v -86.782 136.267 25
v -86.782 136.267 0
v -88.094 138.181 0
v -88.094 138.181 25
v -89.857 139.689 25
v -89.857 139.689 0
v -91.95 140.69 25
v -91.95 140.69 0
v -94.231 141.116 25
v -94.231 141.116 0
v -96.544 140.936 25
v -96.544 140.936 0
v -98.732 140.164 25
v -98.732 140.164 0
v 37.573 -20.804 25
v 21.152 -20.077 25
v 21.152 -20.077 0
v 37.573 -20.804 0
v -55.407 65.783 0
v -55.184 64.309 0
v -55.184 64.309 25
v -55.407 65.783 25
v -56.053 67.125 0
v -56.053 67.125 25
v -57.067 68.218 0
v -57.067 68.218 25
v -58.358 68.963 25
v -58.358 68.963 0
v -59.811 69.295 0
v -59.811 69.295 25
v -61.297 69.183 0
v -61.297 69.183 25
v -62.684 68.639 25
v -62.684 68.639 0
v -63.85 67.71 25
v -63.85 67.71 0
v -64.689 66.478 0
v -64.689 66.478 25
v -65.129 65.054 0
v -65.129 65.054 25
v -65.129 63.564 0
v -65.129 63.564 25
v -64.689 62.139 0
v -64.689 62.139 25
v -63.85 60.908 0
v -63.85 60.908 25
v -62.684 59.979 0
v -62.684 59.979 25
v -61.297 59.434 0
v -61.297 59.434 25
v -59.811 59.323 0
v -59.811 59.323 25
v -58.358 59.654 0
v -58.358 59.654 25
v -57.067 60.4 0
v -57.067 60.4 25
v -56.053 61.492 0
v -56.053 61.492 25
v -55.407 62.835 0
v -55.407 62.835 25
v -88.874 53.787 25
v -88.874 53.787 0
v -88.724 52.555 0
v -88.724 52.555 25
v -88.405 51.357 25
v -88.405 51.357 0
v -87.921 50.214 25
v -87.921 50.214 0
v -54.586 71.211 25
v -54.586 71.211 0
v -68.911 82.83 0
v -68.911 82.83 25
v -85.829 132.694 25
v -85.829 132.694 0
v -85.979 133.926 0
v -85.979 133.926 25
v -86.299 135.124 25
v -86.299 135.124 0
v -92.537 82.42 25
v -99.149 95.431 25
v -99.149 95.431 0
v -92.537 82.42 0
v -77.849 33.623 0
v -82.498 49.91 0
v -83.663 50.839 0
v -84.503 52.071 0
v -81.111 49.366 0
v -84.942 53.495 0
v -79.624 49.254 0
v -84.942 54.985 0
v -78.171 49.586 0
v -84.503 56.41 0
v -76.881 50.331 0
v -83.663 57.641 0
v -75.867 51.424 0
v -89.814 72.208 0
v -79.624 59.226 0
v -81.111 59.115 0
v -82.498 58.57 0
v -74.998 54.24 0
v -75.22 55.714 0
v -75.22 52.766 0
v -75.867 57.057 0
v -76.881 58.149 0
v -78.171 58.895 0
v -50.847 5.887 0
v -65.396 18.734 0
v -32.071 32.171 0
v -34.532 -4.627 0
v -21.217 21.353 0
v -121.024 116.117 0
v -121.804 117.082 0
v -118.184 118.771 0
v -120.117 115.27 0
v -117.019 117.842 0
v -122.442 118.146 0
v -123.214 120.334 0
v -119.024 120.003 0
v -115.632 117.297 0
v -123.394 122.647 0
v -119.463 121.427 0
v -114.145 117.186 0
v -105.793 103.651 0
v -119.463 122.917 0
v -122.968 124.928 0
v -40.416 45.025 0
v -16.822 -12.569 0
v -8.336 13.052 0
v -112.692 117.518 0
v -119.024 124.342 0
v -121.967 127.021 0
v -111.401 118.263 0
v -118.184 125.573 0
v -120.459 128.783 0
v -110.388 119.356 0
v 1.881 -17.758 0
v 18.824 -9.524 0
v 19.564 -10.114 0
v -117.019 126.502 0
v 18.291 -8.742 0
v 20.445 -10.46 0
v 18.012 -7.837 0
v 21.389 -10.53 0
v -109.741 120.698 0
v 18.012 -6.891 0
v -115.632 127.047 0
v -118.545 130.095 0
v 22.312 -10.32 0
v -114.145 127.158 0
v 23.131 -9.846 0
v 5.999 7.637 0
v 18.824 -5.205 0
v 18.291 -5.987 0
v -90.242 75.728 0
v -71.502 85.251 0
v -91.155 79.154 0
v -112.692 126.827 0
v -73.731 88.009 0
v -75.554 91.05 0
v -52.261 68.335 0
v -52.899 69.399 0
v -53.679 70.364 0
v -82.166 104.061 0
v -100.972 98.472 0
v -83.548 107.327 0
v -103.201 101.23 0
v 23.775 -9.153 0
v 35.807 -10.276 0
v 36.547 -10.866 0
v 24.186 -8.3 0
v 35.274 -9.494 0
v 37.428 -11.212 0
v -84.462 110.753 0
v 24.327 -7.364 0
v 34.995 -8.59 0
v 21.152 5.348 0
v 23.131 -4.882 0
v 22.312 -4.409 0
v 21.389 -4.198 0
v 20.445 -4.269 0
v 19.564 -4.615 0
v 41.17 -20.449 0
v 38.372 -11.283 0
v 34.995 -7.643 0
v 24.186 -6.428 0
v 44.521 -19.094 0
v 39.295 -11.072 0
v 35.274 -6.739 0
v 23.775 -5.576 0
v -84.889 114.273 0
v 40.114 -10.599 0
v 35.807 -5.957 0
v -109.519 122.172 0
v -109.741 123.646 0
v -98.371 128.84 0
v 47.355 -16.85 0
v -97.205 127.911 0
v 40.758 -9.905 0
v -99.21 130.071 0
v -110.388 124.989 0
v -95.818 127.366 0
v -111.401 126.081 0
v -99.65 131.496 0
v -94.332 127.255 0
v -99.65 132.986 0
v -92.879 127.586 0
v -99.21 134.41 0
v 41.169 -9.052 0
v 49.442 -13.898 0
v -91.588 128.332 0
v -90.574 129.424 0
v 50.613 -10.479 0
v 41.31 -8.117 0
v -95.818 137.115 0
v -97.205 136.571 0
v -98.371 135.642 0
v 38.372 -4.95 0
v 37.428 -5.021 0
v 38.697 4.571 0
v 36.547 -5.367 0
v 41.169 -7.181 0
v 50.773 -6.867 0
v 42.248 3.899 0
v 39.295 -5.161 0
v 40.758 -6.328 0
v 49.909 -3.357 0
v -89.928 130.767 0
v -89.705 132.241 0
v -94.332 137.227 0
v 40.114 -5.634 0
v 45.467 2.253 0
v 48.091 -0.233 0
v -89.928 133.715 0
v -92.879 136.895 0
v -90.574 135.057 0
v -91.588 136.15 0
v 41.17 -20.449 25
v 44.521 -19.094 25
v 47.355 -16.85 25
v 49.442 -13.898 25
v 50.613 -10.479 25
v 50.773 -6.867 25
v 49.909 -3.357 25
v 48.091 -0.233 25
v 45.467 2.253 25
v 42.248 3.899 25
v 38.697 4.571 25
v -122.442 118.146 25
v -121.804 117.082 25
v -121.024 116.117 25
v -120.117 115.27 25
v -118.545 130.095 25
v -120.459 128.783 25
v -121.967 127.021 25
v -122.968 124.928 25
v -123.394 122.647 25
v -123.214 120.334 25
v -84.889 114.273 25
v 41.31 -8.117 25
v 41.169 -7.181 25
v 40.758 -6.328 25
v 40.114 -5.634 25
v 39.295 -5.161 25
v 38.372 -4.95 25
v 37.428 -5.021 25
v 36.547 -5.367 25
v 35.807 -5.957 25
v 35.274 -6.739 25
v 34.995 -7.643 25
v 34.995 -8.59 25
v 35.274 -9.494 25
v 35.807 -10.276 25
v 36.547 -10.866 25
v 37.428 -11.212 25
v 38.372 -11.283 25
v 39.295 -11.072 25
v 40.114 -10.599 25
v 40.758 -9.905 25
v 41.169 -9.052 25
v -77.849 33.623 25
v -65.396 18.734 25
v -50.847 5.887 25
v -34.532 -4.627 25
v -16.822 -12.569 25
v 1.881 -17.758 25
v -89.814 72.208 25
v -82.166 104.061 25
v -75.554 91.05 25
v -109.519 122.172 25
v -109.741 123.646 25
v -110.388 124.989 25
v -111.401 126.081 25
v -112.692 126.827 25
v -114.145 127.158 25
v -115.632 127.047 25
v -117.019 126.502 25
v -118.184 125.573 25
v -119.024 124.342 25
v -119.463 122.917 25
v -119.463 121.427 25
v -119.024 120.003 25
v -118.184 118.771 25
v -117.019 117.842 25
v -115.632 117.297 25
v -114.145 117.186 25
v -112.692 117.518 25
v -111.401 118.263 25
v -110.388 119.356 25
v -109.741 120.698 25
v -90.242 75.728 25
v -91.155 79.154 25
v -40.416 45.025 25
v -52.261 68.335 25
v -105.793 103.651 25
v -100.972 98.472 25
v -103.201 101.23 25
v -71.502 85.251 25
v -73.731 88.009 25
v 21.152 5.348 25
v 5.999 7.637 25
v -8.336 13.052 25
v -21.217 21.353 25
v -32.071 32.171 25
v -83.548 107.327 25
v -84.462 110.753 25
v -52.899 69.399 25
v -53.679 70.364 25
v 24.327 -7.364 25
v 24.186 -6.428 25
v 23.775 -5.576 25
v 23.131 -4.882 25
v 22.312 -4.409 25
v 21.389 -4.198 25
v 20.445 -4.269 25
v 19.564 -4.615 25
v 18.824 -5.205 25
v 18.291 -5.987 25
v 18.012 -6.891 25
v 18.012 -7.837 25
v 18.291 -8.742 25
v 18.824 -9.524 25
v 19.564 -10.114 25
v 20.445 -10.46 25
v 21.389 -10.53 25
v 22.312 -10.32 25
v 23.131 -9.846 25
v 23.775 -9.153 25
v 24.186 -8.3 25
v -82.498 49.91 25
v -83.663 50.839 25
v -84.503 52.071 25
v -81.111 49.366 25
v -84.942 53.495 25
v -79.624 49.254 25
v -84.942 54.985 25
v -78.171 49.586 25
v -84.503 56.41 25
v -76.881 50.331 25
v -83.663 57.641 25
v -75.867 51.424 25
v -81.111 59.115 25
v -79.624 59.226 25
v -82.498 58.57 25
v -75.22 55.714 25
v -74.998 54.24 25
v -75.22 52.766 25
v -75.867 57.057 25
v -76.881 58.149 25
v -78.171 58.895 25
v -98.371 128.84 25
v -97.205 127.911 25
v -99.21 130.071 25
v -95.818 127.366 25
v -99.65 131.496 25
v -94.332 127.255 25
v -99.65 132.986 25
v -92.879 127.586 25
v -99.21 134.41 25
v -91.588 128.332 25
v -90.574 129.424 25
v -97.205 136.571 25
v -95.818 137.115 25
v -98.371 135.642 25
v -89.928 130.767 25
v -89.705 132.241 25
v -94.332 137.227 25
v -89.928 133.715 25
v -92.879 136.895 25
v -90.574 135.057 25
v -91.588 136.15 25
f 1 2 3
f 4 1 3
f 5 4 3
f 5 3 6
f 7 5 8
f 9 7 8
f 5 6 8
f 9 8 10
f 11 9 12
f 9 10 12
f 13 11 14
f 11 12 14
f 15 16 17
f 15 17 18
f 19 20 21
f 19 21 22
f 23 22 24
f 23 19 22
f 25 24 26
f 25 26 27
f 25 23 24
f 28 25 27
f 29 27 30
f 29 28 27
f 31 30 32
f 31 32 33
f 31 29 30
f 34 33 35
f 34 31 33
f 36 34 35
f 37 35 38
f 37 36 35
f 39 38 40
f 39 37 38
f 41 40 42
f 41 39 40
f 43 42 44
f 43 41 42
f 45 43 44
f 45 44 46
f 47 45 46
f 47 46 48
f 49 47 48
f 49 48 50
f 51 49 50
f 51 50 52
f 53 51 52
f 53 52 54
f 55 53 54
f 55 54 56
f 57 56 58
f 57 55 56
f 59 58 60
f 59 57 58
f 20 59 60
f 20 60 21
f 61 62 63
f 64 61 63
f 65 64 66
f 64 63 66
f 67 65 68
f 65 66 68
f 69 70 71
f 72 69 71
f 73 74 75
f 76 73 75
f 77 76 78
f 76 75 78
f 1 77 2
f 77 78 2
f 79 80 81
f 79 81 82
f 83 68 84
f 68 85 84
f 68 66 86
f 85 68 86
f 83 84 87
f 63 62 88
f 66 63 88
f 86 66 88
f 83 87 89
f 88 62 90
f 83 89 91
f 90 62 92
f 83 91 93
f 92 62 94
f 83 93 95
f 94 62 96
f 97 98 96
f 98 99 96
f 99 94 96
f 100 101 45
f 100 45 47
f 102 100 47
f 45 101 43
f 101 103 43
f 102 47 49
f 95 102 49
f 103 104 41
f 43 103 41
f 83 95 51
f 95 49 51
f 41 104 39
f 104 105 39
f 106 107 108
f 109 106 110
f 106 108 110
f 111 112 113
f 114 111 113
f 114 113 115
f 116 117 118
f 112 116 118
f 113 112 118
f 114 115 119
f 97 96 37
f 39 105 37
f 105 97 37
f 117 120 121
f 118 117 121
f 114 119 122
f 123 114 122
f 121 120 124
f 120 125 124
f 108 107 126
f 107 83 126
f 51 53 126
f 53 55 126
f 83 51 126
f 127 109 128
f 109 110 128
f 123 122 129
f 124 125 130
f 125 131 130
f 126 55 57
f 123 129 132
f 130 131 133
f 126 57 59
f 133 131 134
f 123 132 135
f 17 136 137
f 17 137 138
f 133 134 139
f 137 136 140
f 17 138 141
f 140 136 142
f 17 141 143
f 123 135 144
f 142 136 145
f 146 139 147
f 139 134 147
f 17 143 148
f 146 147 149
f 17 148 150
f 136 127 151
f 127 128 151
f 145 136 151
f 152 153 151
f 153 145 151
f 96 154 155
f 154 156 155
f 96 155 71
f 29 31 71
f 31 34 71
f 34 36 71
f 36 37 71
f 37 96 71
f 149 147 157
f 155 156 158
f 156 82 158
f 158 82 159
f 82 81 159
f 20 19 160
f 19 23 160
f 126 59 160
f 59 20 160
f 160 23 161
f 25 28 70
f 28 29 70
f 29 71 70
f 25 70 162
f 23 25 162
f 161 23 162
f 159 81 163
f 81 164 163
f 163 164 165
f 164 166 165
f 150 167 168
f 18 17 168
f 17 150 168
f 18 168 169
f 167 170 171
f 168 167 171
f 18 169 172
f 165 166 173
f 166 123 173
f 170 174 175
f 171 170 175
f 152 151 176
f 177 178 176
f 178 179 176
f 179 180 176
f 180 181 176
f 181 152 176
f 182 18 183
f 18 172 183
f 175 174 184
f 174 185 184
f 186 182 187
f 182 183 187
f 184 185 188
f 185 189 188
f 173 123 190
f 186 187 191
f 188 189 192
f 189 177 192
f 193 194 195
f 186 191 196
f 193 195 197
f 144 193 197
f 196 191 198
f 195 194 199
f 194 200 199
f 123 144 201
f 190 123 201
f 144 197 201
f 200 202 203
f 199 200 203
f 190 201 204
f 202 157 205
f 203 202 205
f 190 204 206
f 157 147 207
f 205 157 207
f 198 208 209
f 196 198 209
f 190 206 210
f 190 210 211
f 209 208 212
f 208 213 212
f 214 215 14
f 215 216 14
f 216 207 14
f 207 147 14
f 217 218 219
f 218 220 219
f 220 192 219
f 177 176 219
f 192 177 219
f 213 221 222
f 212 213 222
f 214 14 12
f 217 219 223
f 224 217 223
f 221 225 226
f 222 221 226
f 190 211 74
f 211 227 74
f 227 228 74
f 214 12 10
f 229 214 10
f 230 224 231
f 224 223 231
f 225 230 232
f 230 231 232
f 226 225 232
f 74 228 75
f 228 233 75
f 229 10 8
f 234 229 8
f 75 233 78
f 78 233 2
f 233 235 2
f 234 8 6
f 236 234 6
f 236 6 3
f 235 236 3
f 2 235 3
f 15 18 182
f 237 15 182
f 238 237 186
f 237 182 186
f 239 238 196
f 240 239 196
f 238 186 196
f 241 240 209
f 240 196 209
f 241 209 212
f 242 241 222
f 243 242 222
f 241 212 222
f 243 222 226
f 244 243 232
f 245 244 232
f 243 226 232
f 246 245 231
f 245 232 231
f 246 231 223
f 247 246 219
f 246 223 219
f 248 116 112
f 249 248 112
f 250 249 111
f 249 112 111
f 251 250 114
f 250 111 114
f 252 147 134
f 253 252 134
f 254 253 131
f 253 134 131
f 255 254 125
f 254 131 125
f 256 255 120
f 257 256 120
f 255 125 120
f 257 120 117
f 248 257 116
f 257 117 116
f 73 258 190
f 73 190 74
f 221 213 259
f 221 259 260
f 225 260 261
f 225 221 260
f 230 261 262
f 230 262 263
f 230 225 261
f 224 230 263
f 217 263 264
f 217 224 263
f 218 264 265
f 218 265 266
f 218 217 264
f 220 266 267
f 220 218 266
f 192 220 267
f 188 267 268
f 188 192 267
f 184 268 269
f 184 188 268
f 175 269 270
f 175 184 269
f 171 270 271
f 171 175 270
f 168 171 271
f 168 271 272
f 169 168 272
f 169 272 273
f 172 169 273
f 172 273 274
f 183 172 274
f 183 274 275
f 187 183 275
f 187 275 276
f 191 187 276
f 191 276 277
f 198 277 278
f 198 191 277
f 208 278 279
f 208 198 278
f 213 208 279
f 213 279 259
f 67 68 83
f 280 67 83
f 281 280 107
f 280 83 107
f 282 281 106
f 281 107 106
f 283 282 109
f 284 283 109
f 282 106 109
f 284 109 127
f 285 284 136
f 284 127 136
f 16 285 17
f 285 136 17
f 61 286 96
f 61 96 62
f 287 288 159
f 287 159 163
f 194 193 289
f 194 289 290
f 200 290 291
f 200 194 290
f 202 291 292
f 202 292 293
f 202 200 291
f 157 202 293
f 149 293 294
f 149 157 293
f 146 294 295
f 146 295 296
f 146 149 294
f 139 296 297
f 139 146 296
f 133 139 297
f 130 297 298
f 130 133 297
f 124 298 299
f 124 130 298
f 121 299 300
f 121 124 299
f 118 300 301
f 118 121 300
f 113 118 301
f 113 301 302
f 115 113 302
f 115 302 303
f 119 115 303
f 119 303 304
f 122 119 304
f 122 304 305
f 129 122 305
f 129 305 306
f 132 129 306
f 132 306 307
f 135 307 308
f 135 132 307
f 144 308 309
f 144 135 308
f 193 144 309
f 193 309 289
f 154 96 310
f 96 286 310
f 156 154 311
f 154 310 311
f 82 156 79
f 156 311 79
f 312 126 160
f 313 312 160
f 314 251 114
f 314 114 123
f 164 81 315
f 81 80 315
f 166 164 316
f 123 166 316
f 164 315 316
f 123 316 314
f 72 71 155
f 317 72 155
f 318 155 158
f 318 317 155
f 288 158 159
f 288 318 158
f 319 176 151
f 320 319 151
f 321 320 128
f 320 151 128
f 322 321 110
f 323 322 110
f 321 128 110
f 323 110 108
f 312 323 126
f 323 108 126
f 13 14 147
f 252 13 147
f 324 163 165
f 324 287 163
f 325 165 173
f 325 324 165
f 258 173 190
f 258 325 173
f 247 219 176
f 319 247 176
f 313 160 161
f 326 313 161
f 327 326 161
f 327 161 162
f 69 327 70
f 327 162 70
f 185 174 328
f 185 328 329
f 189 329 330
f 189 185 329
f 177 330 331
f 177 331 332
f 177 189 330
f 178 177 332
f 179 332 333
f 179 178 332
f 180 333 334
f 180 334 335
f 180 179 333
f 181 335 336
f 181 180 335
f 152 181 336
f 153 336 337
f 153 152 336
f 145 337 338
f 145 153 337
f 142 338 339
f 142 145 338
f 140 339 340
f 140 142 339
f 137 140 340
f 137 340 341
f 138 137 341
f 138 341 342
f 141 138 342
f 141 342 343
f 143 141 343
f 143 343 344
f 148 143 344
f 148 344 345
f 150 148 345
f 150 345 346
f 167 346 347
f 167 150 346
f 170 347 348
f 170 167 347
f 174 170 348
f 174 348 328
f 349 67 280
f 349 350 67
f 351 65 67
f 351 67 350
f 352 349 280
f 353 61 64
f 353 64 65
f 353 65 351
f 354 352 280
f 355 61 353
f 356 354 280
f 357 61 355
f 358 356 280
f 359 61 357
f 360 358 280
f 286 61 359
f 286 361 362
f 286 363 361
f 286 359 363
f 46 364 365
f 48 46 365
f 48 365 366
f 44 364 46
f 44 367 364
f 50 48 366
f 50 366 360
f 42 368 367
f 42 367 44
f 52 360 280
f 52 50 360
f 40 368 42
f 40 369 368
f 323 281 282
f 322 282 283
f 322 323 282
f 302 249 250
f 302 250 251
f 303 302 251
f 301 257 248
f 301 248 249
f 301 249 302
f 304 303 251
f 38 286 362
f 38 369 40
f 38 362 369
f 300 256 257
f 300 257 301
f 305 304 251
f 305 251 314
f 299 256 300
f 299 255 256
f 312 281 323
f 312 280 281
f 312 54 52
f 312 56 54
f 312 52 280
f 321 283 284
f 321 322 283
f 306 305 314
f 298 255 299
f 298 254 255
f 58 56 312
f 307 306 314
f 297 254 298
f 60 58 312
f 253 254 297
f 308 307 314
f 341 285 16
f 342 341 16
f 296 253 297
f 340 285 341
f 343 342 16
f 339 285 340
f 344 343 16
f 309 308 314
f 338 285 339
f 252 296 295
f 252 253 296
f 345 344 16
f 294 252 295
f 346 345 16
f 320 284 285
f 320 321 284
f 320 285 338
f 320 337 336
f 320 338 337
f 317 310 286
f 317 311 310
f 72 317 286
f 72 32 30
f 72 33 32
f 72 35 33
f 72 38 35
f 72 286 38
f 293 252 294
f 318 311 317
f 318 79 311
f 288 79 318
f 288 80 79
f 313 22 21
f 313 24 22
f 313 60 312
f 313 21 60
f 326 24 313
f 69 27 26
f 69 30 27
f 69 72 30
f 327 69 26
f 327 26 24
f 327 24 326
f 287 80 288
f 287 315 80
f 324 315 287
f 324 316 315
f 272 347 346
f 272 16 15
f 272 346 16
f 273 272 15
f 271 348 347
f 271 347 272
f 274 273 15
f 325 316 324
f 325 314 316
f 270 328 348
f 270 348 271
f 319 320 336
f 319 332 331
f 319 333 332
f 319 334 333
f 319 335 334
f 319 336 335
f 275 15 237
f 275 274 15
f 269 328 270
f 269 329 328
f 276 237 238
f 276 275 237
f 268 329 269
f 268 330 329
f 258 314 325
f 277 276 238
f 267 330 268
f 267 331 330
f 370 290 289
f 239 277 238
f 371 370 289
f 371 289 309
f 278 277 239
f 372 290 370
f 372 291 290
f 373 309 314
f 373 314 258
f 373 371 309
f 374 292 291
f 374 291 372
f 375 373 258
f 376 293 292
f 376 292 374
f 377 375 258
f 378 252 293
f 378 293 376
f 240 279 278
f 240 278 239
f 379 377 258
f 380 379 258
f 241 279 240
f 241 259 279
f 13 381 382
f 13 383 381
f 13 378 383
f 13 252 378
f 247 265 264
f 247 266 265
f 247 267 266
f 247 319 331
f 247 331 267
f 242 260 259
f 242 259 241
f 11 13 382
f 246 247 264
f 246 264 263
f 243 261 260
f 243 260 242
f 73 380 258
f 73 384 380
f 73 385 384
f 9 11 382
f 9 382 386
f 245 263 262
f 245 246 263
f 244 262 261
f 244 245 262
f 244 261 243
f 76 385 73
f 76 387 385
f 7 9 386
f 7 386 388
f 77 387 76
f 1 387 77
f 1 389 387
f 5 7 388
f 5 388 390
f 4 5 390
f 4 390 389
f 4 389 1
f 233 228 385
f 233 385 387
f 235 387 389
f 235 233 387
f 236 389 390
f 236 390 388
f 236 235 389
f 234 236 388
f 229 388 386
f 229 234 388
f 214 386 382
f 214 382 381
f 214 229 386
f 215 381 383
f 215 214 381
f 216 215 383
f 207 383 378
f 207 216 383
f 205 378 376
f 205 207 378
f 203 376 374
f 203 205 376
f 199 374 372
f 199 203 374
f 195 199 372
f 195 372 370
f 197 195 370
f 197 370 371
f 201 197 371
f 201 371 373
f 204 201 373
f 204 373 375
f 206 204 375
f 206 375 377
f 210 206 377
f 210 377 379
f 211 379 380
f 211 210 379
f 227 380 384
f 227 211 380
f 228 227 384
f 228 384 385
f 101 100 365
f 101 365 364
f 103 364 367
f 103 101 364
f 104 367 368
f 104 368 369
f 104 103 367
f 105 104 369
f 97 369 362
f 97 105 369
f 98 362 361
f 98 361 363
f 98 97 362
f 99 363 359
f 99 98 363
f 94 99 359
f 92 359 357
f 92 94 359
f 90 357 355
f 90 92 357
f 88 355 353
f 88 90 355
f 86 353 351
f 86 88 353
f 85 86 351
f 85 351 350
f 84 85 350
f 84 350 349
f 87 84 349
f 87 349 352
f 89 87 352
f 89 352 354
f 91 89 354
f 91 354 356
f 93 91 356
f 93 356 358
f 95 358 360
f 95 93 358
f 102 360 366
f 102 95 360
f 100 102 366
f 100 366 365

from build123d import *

# Parameters (mm, degrees)
F1_R     = 3.175
F1_R_2   = 5
F2_DEPTH = 25
F3_R     = 25.4


with BuildPart() as f2:
    # F1 (on Top) → F2 (new body)
    with BuildSketch(Plane.XY):
        with BuildLine():
            ThreePointArc((-71.110451, 54.240226), (-77.927858, 45.597173), (-87.921111, 50.213914))
            ThreePointArc((-87.921111, 50.213914), (-42.888123, 0.321655), (21.151845, -20.076632))
            Line((21.151845, -20.076632), (37.572558, -20.804112))
            ThreePointArc((37.572558, -20.804112), (50.822204, -8.678648), (38.69674, 4.570998))
            Line((38.69674, 4.570998), (21.151845, 5.348282))
            ThreePointArc((21.151845, 5.348282), (-14.99621, 16.862317), (-40.41557, 45.024544))
            Line((-40.41557, 45.024544), (-52.261319, 68.33515))
            ThreePointArc((-52.261319, 68.33515), (-51.541425, 66.37893), (-51.296978, 64.308837))
            ThreePointArc((-51.296978, 64.308837), (-68.207732, 60.485871), (-54.585882, 71.211255))
            Line((-54.585882, 71.211255), (-73.106711, 86.233619))
            Line((-73.106711, 86.233619), (-84.613695, 108.877588))
            Line((-84.613695, 108.877588), (-85.829489, 132.69385))
            ThreePointArc((-85.829489, 132.69385), (-85.820821, 132.46737), (-85.817931, 132.240743))
            ThreePointArc((-85.817931, 132.240743), (-99.353216, 124.665405), (-98.731743, 140.163903))
            Line((-98.731743, 140.163903), (-118.545215, 130.095292))
            ThreePointArc((-118.545215, 130.095292), (-109.871118, 129.74747), (-105.631403, 122.172132))
            ThreePointArc((-105.631403, 122.172132), (-110.695938, 114.148879), (-120.117499, 115.269714))
            Line((-120.117499, 115.269714), (-101.596671, 100.24735))
            Line((-101.596671, 100.24735), (-90.089687, 77.603381))
            Line((-90.089687, 77.603381), (-88.873893, 53.787119))
            ThreePointArc((-88.873893, 53.787119), (-80.224578, 63.124836), (-71.110451, 54.240226))
        make_face()
        with Locations((21.151845, -7.364175)):
            Circle(F1_R, mode=Mode.SUBTRACT)
        with Locations((38.134649, -8.116557)):
            Circle(F1_R, mode=Mode.SUBTRACT)
        with BuildLine():
            ThreePointArc((-118.545215, 130.095292), (-122.968456, 124.92762), (-122.442064, 118.14582))
            ThreePointArc((-122.442064, 118.14582), (-121.431028, 116.585524), (-120.117499, 115.269714))
            ThreePointArc((-120.117499, 115.269714), (-110.695938, 114.148879), (-105.631403, 122.172132))
            ThreePointArc((-105.631403, 122.172132), (-109.871118, 129.74747), (-118.545215, 130.095292))
        make_face()
        with Locations((-114.518903, 122.172132)):
            Circle(F1_R_2, mode=Mode.SUBTRACT)
        with BuildLine():
            ThreePointArc((-86.78227, 136.267055), (-91.949943, 140.690296), (-98.731743, 140.163903))
            ThreePointArc((-98.731743, 140.163903), (-99.353216, 124.665405), (-85.817931, 132.240743))
            ThreePointArc((-85.817931, 132.240743), (-85.820821, 132.46737), (-85.829489, 132.69385))
            ThreePointArc((-85.829489, 132.69385), (-86.117974, 134.530557), (-86.78227, 136.267055))
        make_face()
        with Locations((-94.705431, 132.240743)):
            Circle(F1_R_2, mode=Mode.SUBTRACT)
        with BuildLine():
            ThreePointArc((-88.873893, 53.787119), (-88.585408, 51.950412), (-87.921111, 50.213914))
            ThreePointArc((-87.921111, 50.213914), (-77.927858, 45.597173), (-71.110451, 54.240226))
            ThreePointArc((-71.110451, 54.240226), (-80.224578, 63.124836), (-88.873893, 53.787119))
        make_face()
        with Locations((-79.997951, 54.240226)):
            Circle(F1_R_2, mode=Mode.SUBTRACT)
        with BuildLine():
            ThreePointArc((-51.296978, 64.308837), (-51.541425, 66.37893), (-52.261319, 68.33515))
            ThreePointArc((-52.261319, 68.33515), (-53.272354, 69.895445), (-54.585882, 71.211255))
            ThreePointArc((-54.585882, 71.211255), (-68.207732, 60.485871), (-51.296978, 64.308837))
        make_face()
        with Locations((-60.184478, 64.308837)):
            Circle(F1_R_2, mode=Mode.SUBTRACT)
    extrude(amount=F2_DEPTH)

    # F3
    f3_edges = [f2.edges().sort_by_distance(p)[0] for p in [
        (-73.106711, 86.233619, 12.5),
        (-84.613695, 108.877588, 12.5),
        (-101.596671, 100.24735, 12.5),
        (-90.089687, 77.603381, 12.5),
    ]]
    fillet(f3_edges, radius=F3_R)


solid = f2.part
